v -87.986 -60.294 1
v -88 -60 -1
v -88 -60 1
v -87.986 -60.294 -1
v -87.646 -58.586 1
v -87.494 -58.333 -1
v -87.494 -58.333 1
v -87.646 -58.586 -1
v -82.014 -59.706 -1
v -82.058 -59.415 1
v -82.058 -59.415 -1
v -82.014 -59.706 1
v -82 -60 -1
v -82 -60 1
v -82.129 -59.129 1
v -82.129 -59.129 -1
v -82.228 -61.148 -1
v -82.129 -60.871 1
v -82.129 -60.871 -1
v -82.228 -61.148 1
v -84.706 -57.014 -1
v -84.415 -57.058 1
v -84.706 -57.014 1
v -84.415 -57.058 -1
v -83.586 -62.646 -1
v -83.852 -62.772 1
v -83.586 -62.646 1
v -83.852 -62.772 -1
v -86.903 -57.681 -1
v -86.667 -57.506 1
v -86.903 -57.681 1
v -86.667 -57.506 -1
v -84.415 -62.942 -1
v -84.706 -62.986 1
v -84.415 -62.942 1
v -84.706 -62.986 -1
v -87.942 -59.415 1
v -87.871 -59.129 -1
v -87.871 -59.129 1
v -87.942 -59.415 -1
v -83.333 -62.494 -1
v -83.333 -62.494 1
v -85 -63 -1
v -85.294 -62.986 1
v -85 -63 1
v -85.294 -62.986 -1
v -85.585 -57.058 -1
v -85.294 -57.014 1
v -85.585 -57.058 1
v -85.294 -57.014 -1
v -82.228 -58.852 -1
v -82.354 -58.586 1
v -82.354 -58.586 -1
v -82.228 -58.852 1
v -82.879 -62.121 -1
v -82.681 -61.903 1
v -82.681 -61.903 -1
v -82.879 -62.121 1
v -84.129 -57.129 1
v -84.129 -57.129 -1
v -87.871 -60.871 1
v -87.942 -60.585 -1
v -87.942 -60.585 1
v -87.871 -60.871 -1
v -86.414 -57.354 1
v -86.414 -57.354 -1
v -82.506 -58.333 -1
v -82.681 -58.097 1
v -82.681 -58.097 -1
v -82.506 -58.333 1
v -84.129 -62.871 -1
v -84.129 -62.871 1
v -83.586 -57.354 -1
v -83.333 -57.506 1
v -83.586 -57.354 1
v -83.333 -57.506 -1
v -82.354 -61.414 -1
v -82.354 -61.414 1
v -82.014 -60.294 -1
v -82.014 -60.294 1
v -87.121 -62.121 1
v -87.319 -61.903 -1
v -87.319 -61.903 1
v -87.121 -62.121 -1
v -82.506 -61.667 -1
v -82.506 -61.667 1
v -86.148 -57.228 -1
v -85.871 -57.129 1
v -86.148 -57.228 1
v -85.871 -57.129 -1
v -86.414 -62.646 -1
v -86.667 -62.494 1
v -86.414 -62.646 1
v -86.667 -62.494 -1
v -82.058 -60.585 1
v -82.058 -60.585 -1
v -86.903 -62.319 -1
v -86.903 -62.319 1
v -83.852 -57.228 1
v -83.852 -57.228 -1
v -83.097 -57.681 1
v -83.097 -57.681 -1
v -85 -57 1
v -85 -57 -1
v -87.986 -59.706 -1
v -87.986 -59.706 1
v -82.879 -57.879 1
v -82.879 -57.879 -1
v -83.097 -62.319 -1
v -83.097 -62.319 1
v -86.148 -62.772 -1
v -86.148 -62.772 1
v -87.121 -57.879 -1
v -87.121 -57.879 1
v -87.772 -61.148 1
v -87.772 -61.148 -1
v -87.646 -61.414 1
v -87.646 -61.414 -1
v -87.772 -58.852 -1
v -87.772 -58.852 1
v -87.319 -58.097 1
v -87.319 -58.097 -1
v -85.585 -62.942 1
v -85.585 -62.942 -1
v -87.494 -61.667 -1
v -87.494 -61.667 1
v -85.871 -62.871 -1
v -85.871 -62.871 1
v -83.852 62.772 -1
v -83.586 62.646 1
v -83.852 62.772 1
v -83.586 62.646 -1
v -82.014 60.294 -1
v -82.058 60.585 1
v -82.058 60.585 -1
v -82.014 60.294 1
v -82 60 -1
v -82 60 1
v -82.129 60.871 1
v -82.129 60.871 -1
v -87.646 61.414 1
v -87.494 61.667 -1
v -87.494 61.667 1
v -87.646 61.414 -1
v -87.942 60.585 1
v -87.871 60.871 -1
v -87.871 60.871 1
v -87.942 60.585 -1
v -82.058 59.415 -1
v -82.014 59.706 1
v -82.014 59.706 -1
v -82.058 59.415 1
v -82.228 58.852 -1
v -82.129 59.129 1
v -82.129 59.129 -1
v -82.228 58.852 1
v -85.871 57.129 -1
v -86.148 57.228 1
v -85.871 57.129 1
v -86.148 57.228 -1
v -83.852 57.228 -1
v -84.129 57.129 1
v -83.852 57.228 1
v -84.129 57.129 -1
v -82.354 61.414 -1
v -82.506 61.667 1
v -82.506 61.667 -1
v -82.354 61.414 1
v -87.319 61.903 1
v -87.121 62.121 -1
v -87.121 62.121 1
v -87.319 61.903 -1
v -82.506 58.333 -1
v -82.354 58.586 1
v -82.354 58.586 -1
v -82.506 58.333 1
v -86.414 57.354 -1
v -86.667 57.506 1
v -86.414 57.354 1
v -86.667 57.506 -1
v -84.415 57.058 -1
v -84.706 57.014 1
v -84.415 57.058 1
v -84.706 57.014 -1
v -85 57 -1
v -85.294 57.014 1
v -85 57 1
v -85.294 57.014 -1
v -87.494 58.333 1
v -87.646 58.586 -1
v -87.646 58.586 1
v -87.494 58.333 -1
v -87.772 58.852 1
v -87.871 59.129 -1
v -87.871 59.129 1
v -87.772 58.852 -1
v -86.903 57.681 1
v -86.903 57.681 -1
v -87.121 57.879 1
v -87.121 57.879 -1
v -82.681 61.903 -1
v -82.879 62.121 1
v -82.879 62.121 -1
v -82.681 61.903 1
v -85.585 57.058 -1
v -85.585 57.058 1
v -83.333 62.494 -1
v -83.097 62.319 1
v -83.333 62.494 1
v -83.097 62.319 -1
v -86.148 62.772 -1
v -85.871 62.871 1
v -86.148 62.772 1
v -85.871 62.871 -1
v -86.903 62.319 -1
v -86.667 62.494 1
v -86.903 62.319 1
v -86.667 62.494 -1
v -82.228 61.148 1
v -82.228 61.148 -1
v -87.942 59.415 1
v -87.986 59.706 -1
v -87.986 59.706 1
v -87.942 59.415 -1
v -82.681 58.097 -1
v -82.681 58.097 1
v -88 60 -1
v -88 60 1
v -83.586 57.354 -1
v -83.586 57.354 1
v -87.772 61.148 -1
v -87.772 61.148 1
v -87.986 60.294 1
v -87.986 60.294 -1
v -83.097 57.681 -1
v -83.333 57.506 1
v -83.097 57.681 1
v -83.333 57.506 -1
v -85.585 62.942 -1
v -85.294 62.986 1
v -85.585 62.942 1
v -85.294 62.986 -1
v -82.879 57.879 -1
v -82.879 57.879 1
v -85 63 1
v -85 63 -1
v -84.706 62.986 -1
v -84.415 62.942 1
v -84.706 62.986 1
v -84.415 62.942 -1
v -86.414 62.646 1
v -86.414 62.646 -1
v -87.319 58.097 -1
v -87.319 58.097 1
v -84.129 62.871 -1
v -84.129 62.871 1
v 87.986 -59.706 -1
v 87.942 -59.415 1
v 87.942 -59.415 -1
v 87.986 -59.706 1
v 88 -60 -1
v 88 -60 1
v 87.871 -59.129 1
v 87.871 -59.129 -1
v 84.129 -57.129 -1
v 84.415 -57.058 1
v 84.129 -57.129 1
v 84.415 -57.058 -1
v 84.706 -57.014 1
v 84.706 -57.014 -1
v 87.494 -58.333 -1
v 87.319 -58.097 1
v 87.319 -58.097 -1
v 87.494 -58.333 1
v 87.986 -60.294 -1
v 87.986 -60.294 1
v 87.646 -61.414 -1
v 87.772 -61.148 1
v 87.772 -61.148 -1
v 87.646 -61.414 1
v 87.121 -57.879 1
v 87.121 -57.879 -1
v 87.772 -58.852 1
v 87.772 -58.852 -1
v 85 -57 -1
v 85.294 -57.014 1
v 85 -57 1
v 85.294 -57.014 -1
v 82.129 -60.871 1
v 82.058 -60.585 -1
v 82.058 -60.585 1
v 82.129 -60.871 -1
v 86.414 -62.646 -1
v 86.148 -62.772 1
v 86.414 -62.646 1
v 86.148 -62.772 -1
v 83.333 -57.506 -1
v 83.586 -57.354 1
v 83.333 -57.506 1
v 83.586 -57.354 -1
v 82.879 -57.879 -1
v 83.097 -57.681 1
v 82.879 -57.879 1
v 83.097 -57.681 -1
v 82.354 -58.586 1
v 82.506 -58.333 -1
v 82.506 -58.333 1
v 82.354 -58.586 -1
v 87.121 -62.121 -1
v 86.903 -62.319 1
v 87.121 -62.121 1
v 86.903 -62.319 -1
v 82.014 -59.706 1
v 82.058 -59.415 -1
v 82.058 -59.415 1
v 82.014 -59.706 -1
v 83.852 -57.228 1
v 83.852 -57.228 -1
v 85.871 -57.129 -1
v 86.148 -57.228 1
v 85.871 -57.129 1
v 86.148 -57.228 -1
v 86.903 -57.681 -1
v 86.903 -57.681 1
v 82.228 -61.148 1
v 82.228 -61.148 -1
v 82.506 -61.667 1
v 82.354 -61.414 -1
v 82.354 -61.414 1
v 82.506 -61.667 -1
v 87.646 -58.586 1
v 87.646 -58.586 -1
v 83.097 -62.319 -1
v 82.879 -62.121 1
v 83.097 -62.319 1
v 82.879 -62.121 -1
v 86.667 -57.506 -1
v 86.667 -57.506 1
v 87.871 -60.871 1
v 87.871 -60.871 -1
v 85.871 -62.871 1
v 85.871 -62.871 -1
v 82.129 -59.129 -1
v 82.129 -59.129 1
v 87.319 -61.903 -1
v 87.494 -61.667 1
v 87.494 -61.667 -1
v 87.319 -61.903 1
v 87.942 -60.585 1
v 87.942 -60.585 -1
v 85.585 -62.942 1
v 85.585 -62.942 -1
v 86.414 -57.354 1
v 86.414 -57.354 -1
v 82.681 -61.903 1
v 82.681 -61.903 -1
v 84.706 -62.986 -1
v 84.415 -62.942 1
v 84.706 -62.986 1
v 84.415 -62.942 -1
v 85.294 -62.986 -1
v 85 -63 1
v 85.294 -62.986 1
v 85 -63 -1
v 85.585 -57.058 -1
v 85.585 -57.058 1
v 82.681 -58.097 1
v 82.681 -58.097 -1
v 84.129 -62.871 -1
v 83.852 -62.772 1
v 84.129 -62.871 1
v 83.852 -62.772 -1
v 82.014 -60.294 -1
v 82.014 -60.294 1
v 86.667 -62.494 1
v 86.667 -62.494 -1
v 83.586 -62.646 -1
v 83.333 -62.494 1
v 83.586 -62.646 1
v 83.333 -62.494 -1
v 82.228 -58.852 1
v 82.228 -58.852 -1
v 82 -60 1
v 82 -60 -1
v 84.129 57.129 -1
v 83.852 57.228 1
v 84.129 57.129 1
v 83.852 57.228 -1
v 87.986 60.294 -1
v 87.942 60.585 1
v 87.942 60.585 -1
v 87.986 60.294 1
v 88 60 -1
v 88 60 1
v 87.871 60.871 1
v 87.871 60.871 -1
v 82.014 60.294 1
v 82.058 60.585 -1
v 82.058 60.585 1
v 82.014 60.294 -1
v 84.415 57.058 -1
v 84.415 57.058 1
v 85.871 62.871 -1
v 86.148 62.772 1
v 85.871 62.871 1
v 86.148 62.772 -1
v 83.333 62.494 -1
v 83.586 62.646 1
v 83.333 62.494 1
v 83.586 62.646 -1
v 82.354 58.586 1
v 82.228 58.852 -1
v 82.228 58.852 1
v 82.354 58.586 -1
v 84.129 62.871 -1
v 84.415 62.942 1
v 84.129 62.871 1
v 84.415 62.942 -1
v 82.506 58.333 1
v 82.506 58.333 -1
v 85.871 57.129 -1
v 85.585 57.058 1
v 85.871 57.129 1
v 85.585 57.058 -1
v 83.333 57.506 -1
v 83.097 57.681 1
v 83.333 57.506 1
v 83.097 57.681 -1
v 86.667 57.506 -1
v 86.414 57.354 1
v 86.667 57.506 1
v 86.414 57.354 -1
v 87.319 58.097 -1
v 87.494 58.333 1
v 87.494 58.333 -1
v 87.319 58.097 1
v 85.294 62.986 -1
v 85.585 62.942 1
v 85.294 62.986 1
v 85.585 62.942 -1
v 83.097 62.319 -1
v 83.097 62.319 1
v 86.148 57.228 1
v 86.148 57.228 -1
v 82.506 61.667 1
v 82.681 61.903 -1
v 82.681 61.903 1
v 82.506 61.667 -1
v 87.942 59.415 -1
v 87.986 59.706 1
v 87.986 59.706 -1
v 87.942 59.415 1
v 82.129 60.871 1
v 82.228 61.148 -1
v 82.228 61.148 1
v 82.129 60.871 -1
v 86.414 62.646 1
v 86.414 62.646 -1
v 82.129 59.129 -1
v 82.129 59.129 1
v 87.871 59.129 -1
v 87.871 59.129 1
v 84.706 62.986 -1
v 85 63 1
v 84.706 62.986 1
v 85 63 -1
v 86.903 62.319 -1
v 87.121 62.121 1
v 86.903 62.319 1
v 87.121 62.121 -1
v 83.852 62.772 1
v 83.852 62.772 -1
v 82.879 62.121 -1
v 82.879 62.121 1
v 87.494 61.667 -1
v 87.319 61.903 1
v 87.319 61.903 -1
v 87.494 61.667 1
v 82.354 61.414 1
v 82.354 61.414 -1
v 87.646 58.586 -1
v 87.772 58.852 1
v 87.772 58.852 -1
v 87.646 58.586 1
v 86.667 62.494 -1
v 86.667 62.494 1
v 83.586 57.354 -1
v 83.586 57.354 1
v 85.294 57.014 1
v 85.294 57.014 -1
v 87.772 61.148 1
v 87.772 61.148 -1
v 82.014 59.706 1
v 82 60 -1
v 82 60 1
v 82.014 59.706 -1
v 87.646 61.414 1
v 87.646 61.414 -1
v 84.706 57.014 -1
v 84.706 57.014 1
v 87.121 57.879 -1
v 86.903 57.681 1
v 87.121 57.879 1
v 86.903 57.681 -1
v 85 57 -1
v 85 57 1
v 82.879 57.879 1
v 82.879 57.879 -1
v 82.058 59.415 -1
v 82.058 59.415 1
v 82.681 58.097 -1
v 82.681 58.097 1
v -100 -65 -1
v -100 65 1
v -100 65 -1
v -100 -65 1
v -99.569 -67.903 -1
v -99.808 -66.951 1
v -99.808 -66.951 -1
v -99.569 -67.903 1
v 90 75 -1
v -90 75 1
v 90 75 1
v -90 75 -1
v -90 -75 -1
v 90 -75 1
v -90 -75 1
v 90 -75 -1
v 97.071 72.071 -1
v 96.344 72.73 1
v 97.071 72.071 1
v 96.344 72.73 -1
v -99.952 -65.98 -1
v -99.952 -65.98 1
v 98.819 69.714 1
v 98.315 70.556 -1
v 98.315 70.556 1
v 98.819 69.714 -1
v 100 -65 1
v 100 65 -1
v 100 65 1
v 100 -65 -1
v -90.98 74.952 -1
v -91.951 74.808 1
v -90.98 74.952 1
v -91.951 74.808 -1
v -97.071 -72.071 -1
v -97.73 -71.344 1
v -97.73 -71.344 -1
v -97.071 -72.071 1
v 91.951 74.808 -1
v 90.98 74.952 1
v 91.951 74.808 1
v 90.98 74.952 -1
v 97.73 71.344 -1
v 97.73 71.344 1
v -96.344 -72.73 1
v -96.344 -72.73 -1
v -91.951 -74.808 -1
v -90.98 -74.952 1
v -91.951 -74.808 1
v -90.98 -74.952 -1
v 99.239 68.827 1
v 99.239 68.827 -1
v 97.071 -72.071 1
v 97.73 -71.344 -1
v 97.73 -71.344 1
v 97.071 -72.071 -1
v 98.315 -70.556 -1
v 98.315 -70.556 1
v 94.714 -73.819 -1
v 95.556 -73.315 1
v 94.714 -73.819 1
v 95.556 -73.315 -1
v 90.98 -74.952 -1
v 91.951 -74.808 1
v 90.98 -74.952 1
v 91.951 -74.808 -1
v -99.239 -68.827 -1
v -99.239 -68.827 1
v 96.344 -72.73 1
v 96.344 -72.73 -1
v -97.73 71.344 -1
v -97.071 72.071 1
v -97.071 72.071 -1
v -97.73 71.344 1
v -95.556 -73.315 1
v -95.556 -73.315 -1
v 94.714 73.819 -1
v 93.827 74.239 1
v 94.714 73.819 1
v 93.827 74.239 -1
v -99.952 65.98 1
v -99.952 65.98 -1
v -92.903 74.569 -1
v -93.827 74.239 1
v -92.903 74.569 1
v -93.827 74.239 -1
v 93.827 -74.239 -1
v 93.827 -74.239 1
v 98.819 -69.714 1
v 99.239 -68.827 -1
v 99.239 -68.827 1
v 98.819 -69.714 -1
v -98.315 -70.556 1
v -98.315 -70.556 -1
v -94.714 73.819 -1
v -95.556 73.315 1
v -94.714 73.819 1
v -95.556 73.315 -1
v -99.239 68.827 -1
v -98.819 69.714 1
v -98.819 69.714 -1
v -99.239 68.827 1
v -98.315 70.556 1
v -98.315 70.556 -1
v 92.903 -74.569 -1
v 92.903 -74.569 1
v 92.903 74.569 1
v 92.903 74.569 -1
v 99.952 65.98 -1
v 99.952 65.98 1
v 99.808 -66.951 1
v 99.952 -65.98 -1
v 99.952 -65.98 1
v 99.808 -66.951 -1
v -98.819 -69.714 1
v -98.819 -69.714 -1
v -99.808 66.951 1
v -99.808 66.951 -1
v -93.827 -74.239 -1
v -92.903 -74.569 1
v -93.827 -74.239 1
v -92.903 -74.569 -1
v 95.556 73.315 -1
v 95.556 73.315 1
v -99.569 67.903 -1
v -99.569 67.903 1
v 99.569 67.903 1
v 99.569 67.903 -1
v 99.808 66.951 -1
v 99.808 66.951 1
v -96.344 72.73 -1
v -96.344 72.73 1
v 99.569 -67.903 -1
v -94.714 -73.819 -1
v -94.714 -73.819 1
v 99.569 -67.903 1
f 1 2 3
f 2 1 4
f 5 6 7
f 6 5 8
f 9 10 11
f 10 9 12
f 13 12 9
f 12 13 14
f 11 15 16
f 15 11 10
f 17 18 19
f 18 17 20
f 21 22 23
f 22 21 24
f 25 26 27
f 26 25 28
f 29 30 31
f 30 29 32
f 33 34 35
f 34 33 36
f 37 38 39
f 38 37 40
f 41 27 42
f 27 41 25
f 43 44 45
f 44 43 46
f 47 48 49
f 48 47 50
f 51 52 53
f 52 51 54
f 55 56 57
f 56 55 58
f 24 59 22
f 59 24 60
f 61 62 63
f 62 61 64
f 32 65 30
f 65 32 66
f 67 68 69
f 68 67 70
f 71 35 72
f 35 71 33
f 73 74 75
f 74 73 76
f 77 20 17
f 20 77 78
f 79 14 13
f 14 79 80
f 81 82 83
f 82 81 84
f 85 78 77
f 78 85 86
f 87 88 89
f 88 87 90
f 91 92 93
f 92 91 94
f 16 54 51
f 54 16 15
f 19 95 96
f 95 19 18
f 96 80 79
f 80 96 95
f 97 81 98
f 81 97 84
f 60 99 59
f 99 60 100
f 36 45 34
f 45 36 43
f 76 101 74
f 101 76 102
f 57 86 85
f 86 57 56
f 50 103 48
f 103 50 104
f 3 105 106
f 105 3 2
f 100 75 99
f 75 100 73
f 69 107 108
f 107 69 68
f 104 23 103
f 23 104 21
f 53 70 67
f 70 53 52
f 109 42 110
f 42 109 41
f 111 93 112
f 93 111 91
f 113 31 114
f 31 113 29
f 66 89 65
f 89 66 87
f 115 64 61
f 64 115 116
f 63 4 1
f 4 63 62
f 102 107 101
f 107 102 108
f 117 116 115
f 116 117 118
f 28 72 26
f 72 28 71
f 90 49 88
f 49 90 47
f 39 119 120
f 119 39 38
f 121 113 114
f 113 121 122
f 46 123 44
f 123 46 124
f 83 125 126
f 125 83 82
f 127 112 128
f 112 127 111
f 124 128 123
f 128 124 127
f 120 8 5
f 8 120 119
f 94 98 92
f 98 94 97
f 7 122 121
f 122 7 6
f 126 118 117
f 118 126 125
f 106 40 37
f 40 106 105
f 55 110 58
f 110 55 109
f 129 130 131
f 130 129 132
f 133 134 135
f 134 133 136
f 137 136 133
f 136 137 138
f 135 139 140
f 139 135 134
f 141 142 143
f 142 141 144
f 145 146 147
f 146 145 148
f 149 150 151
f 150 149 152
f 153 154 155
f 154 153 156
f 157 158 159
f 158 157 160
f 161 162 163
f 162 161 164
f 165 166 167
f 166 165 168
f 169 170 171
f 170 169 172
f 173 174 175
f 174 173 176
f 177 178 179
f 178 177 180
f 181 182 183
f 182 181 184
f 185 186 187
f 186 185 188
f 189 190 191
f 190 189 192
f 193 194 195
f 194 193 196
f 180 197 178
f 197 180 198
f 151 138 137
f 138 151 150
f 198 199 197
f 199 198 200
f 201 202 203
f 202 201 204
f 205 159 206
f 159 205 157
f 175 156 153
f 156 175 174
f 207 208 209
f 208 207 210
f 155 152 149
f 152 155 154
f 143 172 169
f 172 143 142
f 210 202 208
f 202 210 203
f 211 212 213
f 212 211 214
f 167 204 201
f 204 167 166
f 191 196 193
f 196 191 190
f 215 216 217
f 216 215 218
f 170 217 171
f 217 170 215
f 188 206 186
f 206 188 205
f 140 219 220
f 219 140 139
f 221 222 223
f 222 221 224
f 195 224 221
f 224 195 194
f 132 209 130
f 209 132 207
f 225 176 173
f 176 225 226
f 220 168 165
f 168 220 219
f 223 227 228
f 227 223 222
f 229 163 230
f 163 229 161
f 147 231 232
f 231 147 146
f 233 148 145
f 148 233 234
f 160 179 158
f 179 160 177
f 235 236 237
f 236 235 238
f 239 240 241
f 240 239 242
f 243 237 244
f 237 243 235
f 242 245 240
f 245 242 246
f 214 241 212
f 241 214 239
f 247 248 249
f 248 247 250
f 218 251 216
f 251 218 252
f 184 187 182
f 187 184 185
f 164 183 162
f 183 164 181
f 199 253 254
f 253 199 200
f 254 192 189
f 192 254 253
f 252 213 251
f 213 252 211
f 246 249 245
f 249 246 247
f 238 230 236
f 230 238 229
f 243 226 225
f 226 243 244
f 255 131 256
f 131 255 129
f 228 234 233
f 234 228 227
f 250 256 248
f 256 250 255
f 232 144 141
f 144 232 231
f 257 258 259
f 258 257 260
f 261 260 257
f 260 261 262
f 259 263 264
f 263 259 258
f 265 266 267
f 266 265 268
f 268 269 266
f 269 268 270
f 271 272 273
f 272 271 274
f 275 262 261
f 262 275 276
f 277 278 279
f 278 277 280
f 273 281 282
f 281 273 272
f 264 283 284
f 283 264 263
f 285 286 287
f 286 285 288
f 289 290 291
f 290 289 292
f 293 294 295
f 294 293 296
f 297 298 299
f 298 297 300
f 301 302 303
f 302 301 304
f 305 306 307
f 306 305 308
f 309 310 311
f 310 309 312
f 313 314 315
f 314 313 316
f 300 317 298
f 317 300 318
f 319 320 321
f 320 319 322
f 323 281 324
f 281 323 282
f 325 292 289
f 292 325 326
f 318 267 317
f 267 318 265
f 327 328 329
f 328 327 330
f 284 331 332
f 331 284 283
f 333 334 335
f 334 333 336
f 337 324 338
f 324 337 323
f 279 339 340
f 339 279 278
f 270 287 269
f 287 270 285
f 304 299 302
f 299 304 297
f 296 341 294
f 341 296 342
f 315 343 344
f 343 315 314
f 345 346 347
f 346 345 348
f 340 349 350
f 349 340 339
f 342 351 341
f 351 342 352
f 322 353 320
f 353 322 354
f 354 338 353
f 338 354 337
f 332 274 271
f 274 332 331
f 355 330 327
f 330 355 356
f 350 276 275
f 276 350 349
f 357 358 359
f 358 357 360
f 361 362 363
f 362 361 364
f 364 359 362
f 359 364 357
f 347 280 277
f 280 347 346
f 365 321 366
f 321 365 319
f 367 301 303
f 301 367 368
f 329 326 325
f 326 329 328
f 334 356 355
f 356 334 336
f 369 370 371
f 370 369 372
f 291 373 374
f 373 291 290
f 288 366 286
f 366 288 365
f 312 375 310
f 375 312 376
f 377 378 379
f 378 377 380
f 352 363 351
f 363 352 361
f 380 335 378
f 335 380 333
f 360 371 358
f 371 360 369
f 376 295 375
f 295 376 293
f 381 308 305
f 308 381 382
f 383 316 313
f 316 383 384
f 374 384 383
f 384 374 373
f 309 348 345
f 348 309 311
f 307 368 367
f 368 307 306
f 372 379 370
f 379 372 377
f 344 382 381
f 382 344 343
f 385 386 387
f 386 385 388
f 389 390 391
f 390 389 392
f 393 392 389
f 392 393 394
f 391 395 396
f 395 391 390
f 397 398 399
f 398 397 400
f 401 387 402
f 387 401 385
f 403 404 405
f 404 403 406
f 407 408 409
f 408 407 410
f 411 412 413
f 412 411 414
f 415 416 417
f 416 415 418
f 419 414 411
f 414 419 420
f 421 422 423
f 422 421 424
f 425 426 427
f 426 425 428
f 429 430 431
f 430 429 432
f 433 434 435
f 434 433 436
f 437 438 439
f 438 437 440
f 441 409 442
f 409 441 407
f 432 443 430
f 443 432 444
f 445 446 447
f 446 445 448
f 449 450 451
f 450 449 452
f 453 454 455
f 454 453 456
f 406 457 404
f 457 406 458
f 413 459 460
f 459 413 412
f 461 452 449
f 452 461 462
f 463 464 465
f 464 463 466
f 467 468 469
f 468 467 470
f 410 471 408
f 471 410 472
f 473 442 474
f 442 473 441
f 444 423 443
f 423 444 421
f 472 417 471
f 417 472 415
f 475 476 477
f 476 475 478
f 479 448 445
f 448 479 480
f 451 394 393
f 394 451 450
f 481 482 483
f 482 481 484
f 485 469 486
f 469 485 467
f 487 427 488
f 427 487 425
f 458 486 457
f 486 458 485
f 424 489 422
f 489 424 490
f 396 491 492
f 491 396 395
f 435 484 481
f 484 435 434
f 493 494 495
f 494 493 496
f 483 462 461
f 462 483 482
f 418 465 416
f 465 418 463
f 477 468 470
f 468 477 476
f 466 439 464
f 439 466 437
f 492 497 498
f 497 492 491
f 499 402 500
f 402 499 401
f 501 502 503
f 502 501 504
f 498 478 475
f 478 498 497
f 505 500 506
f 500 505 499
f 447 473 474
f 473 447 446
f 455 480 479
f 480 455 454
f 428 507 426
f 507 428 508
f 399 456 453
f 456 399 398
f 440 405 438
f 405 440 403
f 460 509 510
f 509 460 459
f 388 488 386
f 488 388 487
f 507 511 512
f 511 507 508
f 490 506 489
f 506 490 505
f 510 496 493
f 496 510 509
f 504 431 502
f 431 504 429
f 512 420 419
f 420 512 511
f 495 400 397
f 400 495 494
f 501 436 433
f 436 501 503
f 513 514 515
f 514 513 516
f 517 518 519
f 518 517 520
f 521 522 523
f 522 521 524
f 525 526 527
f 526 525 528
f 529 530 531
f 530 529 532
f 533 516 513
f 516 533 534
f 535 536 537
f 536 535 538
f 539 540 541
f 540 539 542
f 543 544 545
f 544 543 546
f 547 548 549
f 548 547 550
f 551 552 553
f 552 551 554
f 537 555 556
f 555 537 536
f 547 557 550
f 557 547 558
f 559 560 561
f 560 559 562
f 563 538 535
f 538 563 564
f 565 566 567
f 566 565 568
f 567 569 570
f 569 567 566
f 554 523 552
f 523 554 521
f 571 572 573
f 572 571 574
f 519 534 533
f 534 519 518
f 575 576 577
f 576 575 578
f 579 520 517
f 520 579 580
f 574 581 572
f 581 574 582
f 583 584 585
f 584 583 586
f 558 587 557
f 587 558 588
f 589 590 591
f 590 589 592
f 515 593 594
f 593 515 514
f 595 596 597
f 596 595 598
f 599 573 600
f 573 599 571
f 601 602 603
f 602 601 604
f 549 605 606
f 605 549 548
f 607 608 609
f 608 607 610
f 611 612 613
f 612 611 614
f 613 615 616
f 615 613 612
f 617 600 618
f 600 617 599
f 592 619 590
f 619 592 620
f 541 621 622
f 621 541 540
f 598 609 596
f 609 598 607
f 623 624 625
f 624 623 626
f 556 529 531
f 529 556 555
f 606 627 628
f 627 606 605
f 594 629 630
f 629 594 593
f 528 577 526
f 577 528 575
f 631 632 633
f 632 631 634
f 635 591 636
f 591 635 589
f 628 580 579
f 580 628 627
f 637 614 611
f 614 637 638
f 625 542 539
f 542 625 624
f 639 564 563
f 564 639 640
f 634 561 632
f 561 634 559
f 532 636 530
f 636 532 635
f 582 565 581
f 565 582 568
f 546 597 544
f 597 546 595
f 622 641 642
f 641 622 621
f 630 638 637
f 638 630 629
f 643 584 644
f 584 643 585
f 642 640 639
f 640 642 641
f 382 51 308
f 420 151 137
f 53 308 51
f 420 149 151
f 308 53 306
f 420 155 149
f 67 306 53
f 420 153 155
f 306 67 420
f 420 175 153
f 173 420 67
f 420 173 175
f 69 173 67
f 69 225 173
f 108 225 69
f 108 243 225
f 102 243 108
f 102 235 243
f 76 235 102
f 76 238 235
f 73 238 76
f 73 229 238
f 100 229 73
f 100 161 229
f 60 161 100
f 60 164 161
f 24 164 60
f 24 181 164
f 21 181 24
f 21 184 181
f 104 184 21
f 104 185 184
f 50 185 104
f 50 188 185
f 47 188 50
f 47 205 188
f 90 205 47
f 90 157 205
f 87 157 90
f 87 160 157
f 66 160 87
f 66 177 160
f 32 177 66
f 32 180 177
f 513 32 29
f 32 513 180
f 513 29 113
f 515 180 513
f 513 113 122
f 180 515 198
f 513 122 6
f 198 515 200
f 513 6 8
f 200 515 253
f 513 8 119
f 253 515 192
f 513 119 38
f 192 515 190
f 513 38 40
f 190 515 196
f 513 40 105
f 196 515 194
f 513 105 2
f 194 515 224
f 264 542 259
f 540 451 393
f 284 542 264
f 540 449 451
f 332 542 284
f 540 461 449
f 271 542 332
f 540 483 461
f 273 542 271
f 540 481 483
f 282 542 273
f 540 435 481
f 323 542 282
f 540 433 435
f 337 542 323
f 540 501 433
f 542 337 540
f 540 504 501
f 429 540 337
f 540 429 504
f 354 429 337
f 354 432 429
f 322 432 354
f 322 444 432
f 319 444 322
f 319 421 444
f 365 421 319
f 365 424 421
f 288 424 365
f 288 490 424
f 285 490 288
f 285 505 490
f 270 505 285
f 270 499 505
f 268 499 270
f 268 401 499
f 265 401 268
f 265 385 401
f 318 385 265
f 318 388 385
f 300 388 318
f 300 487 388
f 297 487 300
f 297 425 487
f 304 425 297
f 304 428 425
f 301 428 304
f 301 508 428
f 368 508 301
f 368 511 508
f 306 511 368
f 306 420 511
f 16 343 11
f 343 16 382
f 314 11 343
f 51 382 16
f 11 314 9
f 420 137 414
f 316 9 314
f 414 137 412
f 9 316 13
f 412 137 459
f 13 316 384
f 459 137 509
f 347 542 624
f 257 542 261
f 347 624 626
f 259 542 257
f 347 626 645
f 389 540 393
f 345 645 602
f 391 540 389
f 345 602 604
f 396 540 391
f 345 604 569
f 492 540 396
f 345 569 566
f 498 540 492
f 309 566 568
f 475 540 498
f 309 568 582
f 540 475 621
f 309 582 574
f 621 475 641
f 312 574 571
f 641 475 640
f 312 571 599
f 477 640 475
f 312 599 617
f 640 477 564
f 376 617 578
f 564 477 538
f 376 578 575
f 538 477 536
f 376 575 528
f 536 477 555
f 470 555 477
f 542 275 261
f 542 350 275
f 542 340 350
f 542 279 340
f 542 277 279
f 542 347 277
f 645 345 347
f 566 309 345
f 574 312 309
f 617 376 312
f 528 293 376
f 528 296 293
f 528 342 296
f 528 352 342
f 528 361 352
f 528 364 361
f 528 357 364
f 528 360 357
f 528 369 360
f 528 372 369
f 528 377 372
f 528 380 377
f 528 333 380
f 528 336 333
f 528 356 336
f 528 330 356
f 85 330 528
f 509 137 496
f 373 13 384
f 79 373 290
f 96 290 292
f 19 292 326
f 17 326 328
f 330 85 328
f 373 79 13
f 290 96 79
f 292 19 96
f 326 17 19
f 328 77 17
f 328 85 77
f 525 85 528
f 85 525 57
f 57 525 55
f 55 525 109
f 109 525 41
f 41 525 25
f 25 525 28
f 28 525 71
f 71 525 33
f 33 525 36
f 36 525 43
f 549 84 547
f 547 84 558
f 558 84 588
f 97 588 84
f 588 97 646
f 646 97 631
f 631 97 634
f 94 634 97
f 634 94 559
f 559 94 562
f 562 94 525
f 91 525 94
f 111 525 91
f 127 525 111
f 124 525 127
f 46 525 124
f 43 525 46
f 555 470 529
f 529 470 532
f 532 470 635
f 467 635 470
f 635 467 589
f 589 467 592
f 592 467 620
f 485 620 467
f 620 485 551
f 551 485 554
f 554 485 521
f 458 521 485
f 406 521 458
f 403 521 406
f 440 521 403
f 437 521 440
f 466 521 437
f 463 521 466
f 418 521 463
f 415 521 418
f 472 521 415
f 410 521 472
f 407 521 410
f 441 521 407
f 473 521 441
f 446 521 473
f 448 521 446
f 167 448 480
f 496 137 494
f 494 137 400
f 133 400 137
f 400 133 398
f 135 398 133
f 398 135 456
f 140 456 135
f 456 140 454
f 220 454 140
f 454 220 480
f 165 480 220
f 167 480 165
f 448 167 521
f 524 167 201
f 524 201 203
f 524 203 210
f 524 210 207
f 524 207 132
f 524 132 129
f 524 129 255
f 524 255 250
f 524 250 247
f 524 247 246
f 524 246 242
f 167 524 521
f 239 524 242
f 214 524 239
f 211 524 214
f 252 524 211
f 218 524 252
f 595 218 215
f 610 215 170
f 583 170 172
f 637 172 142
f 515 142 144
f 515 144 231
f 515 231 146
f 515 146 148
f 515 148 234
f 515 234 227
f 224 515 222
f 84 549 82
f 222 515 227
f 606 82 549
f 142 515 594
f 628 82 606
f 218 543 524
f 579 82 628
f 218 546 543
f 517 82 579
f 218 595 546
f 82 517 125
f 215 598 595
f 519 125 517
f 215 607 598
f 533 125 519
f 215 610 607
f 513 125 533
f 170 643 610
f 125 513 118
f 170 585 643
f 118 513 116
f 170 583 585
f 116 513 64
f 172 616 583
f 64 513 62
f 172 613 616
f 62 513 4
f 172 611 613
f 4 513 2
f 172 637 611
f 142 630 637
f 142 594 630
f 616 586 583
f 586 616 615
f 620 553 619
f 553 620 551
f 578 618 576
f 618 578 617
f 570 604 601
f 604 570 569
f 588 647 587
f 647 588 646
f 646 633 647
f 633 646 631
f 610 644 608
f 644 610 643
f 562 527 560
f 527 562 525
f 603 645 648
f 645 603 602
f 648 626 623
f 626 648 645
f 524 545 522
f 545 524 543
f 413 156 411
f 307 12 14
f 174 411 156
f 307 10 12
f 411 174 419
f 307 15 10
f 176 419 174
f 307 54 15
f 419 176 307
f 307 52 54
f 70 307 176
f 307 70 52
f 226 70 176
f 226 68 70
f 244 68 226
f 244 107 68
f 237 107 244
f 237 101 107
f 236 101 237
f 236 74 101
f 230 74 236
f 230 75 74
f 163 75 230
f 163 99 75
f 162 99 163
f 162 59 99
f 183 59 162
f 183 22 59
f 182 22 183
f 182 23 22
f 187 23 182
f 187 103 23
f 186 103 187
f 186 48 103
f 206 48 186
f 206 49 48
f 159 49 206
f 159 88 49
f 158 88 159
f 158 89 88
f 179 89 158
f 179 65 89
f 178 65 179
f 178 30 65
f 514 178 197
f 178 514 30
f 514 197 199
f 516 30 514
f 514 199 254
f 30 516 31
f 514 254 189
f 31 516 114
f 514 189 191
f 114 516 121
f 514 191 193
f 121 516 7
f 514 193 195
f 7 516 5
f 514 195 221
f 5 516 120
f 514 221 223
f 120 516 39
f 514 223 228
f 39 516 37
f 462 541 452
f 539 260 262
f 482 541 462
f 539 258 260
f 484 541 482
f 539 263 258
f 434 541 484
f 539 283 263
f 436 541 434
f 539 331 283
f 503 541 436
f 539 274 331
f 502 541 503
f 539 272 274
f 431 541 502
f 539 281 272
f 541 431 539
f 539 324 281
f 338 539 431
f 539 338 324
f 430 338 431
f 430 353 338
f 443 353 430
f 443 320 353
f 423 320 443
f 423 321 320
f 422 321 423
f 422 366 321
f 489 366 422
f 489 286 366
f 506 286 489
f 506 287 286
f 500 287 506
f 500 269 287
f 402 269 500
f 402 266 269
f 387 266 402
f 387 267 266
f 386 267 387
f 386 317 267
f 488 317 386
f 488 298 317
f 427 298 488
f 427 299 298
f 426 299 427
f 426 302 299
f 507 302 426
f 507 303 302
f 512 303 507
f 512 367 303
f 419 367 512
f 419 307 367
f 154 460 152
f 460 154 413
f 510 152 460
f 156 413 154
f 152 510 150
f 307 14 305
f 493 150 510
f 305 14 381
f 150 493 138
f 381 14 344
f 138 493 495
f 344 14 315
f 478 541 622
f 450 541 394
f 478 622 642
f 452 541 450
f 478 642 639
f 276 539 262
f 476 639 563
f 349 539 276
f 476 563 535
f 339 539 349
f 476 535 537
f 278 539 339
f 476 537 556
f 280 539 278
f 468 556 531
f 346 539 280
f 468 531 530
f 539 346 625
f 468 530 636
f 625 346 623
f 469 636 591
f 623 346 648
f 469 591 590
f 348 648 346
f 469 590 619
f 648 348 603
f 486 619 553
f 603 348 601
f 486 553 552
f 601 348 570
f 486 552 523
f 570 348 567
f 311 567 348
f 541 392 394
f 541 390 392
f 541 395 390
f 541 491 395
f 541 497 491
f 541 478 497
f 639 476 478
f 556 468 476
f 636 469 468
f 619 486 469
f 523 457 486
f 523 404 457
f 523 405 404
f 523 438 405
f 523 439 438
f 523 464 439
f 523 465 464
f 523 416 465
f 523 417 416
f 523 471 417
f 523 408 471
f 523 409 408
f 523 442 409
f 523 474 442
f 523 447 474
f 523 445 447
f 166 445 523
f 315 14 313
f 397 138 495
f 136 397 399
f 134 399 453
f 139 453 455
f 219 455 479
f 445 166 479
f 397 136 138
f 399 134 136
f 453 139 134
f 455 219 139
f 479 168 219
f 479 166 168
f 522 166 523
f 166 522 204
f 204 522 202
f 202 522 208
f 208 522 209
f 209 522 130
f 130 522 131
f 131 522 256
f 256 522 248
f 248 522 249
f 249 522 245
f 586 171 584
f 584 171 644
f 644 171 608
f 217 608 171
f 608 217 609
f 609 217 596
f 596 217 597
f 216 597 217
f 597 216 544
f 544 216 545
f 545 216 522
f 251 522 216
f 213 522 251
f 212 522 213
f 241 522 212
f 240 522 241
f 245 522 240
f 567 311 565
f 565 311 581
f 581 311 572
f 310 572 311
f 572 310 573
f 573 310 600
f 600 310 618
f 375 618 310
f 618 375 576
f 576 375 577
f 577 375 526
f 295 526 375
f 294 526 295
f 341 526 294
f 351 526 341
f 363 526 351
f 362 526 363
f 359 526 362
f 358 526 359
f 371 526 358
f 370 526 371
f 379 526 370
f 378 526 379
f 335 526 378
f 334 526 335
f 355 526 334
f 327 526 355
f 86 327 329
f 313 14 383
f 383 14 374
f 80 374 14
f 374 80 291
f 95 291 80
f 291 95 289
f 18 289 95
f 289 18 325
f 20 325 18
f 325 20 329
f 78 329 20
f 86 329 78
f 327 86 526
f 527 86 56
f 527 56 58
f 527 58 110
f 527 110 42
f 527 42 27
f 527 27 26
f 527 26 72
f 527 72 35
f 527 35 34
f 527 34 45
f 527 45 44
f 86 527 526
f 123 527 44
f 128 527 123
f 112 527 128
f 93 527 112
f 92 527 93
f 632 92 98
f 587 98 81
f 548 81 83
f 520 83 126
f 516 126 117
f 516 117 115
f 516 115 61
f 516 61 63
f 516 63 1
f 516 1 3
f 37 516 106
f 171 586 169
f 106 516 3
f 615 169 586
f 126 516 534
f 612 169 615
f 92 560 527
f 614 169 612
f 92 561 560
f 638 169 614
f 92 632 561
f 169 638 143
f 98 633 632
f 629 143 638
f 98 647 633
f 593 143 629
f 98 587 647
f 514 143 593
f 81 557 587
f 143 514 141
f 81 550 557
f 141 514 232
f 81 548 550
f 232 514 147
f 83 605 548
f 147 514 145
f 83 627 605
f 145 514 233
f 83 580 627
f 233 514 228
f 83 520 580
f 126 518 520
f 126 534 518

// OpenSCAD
// Parameters
sheet_length = 200; //[100:400:1]
sheet_width = 150;  //[75:300:1]
sheet_thickness = 2; //[1:6:0.5]
corner_radius = 10; //[3:25:1]
hole_diameter = 6;  //[3:12:0.5]
edge_margin = 15;   //[8:40:1]

// Quality
$fn = 64;

// Small overlap to avoid coplanar/blank render artifacts
eps = 0.01;

// Derived / clamped values to keep geometry valid
cr = min(corner_radius, min(sheet_length, sheet_width)/2 - eps);
em = min(edge_margin, min(sheet_length, sheet_width)/2 - hole_diameter/2 - eps);

// Rounded rectangle sheet (single solid before holes)
module rounded_sheet() {
    // Use hull of 4 corner cylinders to create a proper rounded-rectangle prism
    hull() {
        for (sx = [-1, 1], sy = [-1, 1]) {
            translate([sx*(sheet_length/2 - cr), sy*(sheet_width/2 - cr), 0])
                cylinder(r=cr, h=sheet_thickness, center=true);
        }
    }
}

module mounting_holes() {
    // Through-holes, slightly longer than thickness to guarantee clean subtraction
    hole_h = sheet_thickness + 2*eps;
    for (sx = [-1, 1], sy = [-1, 1]) {
        translate([sx*(sheet_length/2 - em), sy*(sheet_width/2 - em), 0])
            cylinder(r=hole_diameter/2, h=hole_h, center=true);
    }
}

// Final model: one connected solid (sheet with holes)
difference() {
    rounded_sheet();
    mounting_holes();
}
